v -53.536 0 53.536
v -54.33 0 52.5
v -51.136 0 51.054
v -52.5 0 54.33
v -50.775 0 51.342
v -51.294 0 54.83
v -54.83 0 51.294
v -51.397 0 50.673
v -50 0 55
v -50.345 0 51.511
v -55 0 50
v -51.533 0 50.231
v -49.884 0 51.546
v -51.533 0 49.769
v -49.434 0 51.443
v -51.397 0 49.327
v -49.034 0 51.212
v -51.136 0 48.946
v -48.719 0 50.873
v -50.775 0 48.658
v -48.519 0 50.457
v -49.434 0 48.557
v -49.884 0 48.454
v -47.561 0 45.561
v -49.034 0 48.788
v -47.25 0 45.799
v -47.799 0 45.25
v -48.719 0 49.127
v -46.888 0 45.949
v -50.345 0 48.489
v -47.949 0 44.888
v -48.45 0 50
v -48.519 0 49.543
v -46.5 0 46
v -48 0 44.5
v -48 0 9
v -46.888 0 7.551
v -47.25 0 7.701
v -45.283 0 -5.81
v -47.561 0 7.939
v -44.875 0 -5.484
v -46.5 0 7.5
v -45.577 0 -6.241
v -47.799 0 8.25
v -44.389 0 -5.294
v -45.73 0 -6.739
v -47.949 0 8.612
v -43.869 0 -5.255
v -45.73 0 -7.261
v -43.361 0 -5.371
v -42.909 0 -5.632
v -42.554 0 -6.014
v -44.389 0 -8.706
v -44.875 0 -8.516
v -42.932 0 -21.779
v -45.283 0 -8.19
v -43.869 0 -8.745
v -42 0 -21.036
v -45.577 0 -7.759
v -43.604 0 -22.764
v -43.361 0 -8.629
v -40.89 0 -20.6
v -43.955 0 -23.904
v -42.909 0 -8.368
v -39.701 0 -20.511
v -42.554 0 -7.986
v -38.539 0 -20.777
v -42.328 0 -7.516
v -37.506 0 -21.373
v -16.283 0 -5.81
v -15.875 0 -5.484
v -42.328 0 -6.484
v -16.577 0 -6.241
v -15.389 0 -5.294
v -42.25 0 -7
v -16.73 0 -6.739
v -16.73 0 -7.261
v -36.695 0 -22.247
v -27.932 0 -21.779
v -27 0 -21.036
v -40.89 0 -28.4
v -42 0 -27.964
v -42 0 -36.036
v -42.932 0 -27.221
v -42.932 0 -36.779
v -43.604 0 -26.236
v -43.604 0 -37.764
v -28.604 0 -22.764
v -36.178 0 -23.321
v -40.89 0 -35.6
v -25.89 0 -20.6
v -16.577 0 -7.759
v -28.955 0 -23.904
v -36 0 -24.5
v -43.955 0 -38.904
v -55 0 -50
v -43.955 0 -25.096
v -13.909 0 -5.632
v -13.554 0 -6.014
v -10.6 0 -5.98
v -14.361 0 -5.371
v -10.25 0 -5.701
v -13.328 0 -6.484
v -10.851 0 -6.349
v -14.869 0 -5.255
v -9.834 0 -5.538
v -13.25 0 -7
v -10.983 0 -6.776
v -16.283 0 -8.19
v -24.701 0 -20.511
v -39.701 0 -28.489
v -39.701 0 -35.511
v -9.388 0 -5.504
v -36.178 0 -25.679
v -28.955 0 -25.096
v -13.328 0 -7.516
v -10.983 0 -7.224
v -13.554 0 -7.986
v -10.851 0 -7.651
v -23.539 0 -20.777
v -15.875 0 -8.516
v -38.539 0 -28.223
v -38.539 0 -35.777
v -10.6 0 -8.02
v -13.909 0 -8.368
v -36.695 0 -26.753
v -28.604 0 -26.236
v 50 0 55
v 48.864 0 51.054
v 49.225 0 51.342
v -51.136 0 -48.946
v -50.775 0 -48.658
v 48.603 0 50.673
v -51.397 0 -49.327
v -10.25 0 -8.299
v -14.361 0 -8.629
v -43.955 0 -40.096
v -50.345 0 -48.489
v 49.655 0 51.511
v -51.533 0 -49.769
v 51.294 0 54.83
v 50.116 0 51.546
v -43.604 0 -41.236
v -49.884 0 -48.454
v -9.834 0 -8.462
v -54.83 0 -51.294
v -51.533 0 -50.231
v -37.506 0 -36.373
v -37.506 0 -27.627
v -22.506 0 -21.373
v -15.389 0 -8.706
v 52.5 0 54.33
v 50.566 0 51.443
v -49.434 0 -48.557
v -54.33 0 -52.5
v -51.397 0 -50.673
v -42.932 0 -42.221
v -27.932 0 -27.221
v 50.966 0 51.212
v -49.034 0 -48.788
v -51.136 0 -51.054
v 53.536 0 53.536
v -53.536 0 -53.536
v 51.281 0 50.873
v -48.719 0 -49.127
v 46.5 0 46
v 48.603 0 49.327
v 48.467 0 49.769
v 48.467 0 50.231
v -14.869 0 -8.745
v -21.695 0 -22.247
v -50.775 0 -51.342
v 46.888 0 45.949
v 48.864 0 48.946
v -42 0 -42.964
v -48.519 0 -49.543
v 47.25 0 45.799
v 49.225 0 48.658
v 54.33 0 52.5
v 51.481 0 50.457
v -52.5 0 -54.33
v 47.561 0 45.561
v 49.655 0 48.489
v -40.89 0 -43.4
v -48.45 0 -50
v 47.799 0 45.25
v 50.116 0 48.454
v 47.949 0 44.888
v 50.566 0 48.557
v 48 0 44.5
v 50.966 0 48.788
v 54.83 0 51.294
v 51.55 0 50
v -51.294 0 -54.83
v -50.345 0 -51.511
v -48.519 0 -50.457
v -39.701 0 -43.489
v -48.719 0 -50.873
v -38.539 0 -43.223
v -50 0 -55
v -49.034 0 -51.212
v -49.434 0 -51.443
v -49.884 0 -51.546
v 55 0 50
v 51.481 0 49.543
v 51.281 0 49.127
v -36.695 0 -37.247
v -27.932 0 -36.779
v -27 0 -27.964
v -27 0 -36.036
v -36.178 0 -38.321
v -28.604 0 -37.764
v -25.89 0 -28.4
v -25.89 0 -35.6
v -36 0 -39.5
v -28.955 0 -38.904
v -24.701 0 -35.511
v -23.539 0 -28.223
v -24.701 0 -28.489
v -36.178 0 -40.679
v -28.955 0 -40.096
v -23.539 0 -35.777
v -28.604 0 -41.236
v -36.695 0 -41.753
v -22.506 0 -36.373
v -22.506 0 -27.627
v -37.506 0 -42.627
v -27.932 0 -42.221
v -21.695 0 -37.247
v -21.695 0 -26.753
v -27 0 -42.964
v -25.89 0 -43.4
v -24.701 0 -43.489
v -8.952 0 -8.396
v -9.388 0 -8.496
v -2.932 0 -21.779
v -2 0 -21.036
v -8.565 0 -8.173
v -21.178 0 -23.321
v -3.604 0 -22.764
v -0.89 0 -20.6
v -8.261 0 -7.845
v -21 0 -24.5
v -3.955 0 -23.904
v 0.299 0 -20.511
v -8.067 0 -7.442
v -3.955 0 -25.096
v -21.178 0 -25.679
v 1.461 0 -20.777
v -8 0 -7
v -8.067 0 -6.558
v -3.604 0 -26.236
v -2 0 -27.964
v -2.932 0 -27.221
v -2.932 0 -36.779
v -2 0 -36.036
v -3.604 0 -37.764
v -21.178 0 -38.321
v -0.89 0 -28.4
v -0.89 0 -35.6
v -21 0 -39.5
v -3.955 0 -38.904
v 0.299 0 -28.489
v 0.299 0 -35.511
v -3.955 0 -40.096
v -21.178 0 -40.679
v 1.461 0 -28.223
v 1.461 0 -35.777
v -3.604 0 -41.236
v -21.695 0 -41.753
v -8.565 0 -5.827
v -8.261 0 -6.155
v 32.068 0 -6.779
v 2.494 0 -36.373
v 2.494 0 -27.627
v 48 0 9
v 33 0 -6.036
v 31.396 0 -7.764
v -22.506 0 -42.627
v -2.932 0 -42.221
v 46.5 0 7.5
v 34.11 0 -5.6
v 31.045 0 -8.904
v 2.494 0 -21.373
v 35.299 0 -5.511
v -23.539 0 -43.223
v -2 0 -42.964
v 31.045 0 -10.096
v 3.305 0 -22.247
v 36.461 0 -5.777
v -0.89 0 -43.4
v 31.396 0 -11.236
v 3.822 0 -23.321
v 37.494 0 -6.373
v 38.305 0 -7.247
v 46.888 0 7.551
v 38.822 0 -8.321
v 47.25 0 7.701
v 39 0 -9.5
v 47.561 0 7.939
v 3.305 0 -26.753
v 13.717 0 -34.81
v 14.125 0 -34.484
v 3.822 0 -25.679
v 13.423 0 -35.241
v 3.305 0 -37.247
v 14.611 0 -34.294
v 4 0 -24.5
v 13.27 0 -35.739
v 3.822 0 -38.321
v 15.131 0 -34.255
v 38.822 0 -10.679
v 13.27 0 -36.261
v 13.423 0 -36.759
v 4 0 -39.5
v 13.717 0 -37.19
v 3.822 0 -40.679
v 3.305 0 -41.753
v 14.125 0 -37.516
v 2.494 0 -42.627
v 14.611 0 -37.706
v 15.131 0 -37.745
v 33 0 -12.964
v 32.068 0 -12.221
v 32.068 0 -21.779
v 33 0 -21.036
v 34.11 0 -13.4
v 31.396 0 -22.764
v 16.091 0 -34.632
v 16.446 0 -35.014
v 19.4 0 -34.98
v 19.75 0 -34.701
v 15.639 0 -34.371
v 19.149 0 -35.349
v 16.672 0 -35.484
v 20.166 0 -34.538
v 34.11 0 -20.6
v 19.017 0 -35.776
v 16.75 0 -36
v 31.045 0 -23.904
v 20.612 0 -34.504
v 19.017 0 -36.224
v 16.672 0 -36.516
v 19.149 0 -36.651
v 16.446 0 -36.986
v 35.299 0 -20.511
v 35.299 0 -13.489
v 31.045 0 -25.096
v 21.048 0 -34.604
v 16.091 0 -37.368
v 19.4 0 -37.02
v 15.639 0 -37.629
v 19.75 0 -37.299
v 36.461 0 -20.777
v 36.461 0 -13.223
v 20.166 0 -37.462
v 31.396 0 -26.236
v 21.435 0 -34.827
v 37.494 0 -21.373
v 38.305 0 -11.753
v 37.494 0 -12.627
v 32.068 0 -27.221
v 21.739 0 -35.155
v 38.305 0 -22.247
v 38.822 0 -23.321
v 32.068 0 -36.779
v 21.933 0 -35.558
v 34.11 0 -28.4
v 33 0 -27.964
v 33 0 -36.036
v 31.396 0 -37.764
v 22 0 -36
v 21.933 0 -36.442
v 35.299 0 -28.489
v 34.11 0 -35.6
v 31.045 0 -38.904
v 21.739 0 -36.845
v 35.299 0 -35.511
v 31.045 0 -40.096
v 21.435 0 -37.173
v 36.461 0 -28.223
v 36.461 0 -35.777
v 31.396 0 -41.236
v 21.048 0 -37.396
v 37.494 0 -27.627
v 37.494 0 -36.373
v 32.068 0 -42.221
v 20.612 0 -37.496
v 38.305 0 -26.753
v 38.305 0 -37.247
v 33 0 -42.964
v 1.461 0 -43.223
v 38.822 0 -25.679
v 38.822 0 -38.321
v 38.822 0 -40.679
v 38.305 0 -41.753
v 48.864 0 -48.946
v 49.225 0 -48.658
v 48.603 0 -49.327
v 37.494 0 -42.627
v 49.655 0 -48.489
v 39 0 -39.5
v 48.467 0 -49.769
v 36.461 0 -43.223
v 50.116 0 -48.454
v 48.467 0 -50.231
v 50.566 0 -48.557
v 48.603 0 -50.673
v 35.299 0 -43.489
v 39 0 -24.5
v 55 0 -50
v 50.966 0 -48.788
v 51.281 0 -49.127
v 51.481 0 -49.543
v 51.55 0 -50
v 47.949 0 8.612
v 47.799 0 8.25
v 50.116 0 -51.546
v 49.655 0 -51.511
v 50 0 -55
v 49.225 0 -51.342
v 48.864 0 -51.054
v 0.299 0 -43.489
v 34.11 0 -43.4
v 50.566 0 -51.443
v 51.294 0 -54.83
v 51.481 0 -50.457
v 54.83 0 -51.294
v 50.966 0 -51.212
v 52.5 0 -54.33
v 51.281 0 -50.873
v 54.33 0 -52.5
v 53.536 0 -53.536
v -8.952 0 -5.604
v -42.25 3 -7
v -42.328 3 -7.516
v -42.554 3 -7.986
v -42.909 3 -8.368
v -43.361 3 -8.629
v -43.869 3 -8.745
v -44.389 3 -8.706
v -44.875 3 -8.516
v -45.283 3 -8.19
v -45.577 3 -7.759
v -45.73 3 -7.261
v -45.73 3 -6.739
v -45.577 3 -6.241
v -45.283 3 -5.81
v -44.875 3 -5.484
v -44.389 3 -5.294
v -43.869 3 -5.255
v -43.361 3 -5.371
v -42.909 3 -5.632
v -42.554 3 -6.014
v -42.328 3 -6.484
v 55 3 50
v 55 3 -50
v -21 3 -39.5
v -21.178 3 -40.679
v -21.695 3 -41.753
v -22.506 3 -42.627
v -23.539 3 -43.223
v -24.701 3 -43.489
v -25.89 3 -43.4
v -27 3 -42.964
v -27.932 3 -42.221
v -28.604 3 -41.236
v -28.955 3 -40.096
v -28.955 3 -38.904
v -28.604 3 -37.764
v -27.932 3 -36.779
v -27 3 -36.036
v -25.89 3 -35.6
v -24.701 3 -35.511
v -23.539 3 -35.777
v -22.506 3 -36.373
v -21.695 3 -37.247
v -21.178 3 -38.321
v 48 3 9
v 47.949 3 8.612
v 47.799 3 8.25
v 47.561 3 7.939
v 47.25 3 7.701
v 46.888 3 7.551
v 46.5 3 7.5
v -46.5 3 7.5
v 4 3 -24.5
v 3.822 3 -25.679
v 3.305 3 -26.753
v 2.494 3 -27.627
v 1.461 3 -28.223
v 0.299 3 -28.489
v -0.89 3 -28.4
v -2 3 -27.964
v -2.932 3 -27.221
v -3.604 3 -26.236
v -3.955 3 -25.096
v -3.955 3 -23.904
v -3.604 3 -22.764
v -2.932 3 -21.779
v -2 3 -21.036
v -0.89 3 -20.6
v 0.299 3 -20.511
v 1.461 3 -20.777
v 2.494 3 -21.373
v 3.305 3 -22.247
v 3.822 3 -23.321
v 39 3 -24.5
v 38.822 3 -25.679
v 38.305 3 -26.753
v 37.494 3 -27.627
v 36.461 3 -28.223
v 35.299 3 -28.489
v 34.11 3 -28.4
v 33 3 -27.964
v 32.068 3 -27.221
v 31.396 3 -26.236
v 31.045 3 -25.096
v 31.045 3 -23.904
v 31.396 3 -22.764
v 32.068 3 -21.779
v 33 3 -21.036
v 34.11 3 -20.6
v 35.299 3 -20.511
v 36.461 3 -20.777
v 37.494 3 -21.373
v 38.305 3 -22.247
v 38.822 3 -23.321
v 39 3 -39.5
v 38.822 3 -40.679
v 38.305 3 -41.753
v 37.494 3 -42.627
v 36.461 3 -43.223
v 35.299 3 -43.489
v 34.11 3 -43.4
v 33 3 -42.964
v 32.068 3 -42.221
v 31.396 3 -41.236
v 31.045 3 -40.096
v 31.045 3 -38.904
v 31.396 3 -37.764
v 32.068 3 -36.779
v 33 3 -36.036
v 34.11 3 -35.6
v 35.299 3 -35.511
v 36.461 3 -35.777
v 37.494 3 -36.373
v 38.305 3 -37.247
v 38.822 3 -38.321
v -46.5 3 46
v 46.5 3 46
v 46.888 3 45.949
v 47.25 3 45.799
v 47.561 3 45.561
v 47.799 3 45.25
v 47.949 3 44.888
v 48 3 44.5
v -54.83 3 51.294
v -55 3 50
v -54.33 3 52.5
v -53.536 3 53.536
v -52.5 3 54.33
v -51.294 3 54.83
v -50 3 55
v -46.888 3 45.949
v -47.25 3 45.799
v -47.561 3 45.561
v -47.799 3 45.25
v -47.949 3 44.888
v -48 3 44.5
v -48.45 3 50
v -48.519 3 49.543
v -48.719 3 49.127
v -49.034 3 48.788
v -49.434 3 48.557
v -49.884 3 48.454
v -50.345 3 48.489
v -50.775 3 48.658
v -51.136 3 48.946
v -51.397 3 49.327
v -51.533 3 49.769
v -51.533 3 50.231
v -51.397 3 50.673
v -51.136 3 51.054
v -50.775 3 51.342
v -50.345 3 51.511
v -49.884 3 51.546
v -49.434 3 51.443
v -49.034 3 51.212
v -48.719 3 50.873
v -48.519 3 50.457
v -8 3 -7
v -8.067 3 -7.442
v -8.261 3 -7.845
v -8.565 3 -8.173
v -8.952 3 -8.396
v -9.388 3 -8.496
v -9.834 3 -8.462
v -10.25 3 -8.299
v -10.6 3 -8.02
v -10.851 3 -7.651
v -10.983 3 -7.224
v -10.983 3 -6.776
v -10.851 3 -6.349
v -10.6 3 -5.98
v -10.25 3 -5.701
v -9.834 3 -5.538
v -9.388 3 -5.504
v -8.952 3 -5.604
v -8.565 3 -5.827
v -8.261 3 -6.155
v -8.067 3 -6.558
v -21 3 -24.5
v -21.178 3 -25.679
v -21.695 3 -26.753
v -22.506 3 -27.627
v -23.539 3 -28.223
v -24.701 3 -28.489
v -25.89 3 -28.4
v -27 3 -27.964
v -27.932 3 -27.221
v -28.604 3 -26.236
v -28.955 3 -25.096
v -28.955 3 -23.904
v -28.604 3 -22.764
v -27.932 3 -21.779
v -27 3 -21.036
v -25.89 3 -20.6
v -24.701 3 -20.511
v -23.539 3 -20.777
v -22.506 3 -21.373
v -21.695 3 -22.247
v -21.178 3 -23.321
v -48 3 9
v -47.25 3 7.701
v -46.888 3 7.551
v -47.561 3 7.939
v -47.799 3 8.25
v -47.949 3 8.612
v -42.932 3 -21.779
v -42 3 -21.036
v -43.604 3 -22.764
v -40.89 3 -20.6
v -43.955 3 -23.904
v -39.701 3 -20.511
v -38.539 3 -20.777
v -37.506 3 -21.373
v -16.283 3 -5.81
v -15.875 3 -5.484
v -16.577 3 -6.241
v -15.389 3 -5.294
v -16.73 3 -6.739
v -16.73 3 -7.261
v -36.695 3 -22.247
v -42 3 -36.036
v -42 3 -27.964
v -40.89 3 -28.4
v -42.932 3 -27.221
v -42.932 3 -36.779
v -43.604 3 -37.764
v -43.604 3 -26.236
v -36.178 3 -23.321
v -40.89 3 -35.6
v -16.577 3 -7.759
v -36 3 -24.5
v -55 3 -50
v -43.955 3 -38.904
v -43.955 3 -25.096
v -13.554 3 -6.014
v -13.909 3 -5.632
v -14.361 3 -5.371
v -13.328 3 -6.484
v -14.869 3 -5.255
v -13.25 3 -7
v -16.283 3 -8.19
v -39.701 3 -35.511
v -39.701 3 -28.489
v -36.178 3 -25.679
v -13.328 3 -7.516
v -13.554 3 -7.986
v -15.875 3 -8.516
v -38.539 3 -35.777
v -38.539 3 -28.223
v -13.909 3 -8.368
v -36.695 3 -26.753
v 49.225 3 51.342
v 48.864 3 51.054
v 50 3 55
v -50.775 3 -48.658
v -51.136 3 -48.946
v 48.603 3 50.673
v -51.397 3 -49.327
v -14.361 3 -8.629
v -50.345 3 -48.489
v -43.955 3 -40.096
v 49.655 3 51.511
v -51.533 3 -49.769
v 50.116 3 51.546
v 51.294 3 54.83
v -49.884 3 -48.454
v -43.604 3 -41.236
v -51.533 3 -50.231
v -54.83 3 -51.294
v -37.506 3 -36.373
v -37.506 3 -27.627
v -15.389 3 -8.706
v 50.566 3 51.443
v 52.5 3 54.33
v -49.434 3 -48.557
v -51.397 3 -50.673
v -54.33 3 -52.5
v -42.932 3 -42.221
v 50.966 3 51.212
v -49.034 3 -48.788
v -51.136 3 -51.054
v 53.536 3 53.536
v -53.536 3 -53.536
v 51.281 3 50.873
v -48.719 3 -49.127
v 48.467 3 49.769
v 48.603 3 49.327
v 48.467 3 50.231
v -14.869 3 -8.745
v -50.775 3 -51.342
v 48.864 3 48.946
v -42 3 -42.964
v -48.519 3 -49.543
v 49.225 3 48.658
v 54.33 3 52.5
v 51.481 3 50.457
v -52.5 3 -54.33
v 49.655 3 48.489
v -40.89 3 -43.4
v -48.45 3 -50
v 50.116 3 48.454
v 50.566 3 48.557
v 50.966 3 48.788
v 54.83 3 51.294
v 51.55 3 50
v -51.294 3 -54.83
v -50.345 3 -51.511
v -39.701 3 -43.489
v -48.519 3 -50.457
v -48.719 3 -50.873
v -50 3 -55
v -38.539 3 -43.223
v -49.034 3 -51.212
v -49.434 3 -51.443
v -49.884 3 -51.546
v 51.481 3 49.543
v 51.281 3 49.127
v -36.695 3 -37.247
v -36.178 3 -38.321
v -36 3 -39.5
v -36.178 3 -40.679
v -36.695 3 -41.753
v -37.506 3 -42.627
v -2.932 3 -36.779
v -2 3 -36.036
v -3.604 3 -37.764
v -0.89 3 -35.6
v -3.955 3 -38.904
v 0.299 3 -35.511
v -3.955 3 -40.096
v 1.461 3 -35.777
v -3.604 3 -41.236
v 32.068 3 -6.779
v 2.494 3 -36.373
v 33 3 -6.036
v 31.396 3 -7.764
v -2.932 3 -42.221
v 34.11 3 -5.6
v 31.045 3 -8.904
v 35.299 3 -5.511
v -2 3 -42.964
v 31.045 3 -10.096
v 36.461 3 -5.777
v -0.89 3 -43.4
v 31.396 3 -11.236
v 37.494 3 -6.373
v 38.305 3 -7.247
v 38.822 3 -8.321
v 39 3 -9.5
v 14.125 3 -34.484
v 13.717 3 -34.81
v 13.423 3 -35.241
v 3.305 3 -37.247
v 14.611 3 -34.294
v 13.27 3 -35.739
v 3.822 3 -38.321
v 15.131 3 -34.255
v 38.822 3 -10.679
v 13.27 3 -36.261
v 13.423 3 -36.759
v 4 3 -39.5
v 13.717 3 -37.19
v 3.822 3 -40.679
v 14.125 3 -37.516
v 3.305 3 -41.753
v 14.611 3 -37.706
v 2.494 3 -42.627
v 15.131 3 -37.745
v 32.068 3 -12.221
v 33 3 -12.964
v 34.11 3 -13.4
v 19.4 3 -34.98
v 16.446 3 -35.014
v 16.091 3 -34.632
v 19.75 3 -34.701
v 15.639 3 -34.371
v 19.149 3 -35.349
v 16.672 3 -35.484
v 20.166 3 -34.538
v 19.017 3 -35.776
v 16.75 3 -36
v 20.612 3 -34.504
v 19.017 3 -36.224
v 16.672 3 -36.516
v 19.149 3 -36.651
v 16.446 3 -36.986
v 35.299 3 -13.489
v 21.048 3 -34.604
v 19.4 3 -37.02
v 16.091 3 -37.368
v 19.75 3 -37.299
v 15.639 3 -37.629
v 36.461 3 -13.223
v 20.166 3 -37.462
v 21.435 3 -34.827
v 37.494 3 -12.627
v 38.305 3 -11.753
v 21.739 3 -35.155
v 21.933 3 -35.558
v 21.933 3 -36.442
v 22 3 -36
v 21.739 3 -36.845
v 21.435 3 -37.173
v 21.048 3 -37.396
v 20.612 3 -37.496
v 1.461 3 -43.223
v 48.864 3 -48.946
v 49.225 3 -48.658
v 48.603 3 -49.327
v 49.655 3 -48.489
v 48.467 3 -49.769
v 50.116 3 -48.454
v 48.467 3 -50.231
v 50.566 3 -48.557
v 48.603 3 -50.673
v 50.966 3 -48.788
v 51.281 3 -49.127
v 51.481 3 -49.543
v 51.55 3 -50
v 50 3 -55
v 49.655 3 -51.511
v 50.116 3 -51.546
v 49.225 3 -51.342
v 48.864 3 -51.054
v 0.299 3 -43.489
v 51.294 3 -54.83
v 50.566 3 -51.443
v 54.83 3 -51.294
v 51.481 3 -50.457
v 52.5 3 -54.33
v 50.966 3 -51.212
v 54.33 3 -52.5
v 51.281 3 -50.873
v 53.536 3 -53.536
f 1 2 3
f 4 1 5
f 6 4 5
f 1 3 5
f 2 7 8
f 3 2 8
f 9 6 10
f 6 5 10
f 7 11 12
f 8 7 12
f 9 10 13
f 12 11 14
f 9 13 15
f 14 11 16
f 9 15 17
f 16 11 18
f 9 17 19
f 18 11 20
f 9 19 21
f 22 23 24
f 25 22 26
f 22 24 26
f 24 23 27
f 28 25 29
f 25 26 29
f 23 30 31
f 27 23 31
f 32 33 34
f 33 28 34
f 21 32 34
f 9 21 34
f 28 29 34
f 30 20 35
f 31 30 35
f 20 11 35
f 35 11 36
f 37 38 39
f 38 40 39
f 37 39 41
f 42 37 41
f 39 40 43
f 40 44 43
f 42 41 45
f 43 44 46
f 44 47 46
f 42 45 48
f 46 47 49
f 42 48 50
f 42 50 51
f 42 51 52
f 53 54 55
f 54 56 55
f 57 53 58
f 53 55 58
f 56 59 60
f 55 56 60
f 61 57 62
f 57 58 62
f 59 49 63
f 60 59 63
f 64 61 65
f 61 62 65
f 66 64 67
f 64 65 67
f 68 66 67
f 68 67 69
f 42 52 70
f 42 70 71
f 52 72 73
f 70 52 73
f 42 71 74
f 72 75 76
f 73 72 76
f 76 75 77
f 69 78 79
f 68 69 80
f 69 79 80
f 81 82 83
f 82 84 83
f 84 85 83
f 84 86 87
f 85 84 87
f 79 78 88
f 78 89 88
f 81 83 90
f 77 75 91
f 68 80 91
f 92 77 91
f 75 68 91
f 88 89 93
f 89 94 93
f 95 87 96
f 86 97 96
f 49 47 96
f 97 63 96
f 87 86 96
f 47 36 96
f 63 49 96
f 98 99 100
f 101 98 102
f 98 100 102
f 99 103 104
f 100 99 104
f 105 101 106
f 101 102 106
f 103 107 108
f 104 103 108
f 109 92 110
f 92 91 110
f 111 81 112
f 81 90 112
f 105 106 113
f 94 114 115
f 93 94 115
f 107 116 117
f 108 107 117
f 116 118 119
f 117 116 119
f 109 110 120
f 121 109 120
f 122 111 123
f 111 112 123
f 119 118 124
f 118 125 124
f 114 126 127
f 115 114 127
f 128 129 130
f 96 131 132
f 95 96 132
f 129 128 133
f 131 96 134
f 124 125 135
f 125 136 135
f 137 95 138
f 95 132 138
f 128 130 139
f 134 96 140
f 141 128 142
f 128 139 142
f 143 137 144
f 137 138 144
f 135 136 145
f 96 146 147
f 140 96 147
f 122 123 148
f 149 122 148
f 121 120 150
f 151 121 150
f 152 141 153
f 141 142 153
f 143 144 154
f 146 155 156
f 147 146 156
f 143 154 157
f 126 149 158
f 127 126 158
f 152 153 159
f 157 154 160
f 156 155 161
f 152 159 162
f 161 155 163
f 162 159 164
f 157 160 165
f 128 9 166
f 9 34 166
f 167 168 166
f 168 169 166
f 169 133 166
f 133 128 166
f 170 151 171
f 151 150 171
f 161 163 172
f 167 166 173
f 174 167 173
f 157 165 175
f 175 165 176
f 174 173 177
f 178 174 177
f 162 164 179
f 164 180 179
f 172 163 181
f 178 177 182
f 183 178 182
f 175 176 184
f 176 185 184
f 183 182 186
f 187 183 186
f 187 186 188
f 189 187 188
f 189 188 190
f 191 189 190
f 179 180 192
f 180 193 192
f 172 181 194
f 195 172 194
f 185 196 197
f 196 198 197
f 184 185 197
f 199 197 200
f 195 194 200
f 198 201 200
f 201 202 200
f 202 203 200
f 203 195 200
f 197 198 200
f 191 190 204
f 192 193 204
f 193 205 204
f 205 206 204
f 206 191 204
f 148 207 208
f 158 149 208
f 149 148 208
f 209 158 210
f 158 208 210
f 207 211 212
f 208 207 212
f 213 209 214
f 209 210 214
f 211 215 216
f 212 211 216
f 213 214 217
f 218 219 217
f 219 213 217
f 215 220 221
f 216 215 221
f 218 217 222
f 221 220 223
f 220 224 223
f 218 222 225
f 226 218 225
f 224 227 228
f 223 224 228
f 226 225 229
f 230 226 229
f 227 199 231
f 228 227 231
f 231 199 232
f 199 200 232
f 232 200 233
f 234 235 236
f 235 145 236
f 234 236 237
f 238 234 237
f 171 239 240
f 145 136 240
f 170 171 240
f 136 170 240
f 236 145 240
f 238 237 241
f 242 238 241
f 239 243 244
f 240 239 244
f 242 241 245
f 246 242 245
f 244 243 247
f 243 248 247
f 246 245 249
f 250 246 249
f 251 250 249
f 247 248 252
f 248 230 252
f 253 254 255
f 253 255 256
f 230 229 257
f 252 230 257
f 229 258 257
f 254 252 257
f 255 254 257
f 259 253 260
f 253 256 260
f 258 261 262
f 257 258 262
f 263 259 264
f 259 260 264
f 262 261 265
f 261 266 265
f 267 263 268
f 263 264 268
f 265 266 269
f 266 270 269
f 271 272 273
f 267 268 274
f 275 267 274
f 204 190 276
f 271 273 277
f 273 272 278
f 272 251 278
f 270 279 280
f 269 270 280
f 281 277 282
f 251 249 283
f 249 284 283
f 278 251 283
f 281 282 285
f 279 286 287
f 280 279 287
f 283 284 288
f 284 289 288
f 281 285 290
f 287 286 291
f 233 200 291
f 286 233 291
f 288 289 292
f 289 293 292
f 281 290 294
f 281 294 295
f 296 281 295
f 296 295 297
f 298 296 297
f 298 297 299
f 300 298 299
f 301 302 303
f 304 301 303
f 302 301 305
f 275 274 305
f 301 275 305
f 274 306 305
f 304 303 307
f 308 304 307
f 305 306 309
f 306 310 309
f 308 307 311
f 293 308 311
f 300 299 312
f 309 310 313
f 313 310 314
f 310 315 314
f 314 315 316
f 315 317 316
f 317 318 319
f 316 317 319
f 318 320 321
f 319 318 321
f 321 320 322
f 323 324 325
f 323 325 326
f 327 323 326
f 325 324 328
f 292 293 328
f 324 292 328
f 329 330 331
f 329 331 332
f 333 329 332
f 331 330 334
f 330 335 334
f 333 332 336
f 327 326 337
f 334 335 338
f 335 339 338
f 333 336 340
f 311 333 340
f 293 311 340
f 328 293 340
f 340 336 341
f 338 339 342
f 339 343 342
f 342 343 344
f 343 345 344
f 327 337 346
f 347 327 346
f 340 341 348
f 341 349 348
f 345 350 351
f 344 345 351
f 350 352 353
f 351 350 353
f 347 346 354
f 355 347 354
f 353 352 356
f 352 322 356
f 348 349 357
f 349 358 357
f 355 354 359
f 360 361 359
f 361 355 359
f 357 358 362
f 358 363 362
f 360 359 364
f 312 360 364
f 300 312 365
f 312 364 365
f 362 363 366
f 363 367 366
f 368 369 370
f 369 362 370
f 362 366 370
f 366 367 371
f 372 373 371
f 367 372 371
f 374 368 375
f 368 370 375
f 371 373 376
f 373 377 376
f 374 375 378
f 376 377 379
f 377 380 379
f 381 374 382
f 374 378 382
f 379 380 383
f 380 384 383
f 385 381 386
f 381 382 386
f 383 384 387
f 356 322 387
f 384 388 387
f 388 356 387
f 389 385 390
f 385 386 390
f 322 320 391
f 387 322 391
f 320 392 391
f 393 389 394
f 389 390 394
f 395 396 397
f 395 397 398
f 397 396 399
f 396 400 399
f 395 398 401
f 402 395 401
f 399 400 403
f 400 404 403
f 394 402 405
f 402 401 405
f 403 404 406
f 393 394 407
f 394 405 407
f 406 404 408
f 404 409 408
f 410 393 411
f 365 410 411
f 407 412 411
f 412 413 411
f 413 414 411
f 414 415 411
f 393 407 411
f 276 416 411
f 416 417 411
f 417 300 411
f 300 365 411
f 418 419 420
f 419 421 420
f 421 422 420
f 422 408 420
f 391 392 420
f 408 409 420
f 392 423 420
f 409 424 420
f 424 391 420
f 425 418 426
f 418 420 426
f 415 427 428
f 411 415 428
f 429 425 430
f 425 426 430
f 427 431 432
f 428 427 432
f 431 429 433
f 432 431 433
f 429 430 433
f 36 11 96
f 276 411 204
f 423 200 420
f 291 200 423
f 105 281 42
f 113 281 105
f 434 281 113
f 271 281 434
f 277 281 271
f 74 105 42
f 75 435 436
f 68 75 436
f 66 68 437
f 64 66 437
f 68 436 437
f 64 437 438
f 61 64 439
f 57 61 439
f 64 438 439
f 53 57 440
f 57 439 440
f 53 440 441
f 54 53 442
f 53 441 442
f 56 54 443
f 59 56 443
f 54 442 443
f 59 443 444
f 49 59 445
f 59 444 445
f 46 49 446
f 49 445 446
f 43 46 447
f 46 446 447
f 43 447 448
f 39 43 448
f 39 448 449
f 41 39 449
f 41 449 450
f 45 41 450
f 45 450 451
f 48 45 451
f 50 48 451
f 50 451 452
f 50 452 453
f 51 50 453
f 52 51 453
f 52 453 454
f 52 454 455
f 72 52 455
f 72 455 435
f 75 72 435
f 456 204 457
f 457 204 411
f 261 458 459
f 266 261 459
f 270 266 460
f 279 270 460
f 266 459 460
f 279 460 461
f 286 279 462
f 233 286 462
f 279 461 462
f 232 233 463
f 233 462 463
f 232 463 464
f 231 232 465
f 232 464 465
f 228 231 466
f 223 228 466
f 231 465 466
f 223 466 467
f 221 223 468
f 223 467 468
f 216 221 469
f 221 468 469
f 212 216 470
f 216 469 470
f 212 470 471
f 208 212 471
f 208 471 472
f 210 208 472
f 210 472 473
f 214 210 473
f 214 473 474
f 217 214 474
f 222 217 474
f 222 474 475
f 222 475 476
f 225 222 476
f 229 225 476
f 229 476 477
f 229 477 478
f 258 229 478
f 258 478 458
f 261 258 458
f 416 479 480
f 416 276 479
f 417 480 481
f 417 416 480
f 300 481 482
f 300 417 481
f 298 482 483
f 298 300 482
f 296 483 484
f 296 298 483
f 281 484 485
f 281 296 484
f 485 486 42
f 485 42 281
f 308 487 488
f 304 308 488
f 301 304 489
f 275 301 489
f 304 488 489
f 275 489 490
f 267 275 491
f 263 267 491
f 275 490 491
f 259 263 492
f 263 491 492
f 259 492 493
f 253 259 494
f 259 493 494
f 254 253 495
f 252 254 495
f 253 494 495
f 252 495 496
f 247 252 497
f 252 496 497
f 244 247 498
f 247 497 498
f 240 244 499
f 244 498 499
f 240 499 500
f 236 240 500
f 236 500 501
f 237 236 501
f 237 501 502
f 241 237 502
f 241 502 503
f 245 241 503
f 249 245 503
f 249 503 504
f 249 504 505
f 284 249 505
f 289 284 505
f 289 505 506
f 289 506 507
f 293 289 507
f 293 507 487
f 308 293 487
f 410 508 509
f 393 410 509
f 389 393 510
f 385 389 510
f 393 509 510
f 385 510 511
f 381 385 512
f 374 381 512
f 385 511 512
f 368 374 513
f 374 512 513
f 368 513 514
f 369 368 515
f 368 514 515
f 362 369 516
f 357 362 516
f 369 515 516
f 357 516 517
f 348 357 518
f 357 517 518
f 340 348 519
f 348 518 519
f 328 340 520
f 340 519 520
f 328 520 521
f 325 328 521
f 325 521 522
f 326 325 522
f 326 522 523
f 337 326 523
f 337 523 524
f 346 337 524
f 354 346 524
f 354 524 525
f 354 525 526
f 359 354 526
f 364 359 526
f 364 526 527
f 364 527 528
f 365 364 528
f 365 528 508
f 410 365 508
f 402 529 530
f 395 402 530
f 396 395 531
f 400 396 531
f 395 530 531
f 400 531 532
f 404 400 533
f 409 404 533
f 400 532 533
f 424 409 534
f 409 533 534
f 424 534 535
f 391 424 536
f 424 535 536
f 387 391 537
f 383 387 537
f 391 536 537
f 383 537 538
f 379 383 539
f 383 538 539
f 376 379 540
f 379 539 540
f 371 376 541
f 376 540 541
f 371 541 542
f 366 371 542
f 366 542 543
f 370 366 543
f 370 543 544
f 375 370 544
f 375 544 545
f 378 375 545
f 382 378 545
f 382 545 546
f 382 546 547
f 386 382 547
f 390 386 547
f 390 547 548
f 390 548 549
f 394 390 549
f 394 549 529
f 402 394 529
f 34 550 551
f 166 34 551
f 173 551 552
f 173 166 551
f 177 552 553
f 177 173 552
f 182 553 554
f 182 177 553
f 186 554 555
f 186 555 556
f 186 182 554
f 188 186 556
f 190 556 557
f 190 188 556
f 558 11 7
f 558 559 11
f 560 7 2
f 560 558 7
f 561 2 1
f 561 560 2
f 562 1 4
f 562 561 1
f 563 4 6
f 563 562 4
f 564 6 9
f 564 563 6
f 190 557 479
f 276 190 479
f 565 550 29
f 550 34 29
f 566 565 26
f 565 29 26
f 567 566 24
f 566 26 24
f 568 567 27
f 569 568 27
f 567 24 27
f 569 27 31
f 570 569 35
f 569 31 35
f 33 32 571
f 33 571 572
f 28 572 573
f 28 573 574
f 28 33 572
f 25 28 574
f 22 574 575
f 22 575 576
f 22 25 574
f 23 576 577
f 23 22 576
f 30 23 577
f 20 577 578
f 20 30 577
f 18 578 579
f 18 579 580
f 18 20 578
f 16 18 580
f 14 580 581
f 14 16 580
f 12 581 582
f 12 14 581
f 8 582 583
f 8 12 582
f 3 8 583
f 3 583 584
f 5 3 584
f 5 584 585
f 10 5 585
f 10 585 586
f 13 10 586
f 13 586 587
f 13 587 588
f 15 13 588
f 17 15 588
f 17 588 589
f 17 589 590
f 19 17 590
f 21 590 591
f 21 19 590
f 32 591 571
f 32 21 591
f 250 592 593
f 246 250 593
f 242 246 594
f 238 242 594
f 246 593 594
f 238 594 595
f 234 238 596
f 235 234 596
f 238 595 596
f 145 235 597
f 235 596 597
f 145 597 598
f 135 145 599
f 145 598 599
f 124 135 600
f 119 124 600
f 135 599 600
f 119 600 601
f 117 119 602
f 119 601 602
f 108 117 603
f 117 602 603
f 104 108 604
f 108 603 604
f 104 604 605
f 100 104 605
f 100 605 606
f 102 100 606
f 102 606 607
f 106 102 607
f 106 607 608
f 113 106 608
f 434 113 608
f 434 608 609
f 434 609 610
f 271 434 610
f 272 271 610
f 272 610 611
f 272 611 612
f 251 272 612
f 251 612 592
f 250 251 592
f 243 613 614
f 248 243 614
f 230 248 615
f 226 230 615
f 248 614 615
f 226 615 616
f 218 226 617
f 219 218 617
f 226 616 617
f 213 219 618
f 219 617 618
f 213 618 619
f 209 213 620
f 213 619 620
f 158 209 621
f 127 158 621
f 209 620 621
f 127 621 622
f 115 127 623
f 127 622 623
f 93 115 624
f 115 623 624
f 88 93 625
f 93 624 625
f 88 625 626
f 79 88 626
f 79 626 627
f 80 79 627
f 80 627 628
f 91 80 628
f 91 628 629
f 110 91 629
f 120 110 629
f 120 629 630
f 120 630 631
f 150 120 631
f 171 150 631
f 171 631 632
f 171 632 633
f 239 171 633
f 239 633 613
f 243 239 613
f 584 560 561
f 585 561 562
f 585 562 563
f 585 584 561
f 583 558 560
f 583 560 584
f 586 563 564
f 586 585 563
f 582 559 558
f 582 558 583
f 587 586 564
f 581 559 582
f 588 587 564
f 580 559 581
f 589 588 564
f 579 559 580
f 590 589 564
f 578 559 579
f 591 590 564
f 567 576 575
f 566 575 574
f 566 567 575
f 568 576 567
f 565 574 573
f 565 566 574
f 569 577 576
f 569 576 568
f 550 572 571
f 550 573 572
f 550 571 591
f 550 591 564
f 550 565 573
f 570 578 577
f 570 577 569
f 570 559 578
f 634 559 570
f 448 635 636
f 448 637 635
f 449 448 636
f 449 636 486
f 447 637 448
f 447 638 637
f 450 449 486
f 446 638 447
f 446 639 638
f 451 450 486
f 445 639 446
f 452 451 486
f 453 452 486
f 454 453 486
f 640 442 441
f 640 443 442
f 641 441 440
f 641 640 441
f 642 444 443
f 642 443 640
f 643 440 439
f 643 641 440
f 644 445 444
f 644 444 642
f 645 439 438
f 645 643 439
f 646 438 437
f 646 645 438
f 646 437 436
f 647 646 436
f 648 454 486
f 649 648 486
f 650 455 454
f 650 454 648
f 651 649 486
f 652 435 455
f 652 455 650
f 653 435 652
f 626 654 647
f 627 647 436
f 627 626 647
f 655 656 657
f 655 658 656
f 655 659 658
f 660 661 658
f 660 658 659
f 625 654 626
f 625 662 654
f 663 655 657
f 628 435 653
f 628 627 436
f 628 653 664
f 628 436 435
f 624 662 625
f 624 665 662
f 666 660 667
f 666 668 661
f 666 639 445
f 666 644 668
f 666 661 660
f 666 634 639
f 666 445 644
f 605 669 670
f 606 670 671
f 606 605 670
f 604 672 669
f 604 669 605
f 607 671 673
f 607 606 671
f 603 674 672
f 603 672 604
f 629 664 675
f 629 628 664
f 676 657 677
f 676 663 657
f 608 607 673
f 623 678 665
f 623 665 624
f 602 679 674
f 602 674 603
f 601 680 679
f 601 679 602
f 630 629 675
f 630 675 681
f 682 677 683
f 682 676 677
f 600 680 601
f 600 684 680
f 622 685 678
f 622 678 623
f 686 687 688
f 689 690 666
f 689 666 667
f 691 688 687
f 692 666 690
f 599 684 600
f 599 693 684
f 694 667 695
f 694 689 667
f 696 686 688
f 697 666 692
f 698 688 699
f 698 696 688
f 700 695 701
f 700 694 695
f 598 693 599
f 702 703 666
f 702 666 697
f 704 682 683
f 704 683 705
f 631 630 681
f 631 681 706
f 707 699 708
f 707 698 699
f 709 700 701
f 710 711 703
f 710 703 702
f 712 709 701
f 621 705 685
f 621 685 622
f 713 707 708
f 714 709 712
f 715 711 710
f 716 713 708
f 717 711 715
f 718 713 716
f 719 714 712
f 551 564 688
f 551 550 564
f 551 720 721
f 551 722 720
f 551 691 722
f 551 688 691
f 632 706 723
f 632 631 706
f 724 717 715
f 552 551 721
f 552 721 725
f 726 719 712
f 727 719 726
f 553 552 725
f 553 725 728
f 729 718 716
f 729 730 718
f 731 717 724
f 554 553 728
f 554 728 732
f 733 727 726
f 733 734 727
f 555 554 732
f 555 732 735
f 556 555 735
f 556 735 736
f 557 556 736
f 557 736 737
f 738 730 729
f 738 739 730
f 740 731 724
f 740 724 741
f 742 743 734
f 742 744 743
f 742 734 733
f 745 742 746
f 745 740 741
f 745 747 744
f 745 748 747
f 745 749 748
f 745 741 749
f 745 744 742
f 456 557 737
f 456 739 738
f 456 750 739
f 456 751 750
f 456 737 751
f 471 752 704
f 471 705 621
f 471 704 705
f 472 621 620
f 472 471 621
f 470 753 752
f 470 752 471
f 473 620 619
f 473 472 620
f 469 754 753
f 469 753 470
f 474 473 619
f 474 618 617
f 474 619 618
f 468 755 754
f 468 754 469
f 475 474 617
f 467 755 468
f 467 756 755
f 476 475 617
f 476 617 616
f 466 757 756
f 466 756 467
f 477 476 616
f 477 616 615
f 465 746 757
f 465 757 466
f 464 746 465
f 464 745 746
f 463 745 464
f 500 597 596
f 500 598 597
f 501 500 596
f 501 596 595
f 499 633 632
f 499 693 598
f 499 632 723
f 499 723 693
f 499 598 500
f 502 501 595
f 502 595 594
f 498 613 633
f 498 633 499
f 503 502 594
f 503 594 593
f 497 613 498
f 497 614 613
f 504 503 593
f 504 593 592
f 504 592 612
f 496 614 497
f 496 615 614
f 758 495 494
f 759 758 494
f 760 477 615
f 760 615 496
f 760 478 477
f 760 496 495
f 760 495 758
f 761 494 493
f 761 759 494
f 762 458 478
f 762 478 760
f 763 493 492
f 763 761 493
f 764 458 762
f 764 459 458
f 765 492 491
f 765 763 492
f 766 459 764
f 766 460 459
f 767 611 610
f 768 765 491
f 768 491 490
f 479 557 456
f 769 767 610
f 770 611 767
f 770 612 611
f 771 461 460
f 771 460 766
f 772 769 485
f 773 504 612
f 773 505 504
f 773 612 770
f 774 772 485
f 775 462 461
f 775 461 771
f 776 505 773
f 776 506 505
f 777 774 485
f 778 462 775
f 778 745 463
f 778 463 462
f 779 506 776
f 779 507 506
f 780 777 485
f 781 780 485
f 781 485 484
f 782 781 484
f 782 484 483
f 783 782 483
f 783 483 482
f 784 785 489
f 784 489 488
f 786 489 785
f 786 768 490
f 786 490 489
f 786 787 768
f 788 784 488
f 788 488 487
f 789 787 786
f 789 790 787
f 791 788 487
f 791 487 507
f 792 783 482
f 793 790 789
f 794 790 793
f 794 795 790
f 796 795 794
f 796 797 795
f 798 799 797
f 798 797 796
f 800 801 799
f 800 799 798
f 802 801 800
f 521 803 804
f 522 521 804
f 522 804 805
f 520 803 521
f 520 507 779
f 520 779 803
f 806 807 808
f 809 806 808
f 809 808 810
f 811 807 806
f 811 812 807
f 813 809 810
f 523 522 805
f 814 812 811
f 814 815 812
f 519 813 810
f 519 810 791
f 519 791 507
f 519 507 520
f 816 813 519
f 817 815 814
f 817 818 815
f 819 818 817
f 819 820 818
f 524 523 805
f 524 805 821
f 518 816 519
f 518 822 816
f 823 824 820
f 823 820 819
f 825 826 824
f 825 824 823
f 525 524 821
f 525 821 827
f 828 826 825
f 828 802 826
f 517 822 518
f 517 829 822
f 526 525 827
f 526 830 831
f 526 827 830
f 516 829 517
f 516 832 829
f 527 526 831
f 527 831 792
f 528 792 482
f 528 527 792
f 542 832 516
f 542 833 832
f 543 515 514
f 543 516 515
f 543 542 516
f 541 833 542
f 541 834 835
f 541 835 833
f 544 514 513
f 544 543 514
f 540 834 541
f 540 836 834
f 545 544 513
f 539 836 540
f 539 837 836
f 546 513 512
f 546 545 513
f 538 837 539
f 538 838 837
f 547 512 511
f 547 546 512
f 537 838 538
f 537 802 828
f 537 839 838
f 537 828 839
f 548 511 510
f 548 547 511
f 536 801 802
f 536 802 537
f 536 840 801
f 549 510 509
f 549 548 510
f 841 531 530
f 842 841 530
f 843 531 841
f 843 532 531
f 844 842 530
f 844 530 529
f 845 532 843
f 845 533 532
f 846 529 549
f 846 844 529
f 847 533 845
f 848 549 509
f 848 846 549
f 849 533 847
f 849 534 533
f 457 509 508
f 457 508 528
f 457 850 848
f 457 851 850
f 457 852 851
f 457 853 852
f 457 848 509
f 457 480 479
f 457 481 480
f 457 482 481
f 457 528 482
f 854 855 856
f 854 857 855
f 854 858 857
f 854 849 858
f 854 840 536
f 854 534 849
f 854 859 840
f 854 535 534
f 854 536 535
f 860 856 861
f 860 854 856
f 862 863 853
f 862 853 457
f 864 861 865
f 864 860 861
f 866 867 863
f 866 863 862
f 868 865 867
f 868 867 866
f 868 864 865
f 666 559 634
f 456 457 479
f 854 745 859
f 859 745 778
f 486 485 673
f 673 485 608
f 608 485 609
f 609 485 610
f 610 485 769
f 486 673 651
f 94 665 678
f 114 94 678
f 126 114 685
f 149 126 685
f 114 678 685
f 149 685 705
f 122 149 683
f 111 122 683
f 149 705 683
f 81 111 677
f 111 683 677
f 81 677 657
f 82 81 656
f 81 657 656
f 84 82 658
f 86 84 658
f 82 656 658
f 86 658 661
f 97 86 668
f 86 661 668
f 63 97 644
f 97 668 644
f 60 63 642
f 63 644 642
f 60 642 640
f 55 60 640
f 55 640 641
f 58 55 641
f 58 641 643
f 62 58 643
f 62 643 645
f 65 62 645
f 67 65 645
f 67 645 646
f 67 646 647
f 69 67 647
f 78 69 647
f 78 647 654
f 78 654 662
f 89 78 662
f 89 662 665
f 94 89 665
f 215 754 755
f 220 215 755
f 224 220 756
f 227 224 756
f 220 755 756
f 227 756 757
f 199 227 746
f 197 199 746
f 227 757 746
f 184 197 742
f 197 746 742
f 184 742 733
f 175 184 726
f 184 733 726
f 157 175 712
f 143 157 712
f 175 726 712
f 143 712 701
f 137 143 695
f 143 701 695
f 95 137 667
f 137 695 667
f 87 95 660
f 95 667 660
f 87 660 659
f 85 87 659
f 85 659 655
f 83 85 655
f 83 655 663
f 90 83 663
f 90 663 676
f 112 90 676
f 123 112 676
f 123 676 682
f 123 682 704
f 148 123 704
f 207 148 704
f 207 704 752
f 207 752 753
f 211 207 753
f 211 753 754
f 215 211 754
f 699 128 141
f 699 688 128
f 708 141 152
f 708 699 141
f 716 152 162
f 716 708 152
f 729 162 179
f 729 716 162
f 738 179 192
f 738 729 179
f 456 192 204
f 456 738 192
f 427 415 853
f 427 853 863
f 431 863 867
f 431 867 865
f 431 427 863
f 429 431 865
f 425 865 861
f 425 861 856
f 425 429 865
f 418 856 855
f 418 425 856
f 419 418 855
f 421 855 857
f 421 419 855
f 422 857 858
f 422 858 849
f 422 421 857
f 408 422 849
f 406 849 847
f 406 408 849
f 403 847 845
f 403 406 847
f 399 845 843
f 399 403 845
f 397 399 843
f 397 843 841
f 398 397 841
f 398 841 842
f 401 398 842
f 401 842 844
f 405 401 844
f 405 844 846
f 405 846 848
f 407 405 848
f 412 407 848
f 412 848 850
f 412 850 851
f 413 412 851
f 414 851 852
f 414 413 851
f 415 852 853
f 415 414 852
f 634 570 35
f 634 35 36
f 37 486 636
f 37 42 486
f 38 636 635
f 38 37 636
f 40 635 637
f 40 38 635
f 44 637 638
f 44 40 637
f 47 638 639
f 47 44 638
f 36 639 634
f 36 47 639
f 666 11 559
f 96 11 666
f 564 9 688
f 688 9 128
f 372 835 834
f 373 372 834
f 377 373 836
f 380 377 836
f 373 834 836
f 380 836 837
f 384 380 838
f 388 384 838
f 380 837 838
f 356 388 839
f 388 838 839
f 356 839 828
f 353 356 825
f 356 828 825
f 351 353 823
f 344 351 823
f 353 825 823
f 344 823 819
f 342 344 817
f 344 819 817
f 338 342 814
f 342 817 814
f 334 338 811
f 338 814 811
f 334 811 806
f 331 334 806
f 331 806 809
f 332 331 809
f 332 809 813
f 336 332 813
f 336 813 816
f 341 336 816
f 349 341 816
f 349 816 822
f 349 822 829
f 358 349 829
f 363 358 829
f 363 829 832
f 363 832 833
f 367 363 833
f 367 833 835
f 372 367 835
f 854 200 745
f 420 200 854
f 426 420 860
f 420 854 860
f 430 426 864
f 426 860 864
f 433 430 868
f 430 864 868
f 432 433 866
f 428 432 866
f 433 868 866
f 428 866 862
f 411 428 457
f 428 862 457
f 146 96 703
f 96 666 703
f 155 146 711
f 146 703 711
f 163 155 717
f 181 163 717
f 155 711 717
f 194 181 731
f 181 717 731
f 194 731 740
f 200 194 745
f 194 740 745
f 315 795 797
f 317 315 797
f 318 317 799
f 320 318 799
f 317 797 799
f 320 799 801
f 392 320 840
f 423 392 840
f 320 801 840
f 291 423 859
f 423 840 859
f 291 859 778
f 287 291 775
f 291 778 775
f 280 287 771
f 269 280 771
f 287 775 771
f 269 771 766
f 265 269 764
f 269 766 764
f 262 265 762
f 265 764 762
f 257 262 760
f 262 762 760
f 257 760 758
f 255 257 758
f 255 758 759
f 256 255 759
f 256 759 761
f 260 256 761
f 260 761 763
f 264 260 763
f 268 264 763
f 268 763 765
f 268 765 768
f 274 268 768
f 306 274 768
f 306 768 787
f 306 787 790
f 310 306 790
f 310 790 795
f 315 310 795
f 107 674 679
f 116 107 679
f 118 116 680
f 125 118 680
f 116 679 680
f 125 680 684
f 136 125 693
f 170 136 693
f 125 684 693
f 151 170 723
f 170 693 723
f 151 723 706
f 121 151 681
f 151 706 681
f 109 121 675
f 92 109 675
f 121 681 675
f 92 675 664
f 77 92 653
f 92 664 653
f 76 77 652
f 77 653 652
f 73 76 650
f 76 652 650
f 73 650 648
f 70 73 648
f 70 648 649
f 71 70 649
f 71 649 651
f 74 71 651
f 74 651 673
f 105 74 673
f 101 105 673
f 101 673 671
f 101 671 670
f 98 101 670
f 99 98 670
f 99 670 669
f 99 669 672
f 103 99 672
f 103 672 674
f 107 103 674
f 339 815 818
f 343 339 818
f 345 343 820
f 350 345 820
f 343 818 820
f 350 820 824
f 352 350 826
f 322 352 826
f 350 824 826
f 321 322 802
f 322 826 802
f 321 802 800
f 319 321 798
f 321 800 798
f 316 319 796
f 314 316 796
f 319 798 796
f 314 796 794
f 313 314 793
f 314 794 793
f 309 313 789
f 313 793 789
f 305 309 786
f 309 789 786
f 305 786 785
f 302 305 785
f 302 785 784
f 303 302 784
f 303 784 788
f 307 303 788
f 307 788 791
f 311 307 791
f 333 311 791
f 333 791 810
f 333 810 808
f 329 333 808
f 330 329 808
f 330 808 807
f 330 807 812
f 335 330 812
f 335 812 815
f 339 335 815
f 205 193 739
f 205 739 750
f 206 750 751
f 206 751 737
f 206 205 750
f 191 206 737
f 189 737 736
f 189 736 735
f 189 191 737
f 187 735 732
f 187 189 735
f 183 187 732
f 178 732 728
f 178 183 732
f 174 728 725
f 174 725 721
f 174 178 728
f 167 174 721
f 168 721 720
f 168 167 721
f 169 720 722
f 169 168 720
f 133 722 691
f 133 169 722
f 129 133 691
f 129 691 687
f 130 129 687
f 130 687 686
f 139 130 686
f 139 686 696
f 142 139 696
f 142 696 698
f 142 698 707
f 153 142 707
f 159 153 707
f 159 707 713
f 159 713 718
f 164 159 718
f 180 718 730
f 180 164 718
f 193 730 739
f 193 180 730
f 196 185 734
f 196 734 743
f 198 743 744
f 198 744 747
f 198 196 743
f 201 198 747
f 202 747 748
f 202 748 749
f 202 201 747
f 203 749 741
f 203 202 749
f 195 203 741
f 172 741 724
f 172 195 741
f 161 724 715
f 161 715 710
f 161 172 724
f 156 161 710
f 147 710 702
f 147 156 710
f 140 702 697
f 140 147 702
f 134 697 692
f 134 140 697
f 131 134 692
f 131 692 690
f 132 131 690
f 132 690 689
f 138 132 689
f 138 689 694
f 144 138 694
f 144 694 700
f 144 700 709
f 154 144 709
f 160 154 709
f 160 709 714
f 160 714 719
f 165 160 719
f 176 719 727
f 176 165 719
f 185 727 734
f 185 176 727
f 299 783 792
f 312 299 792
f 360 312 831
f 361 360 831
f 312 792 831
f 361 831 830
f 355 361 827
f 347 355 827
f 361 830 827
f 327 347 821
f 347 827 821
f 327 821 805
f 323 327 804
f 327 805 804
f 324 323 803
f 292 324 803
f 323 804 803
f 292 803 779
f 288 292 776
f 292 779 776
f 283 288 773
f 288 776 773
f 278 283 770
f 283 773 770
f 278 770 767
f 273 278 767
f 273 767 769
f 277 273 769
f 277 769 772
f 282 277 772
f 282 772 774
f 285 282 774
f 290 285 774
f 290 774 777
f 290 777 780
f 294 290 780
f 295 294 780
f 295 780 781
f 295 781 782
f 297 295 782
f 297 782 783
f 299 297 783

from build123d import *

# Parameters (mm, degrees)
SKETCH1_W           = 110
SKETCH1_H           = 110
SKETCH1_R           = 1.55
BOSS_EXTRUDE1_DEPTH = 3
FILLET1_R           = 5
SKETCH2_W           = 96
SKETCH2_H           = 38.5
CUT_EXTRUDE1_DEPTH  = 4
FILLET2_R           = 1.5
SKETCH3_R           = 4
CUT_EXTRUDE2_DEPTH  = 4
SKETCH4_R           = 1.75
SKETCH4_R_2         = 1.5
CUT_EXTRUDE3_DEPTH  = 4


with BuildPart() as part:
    # Sketch1 → Boss-Extrude1 (new body)
    with BuildSketch(Plane(origin=(0, 0, 0), x_dir=(1, 0, 0), z_dir=(0, 1, 0))):
        Rectangle(SKETCH1_W, SKETCH1_H)
        with Locations((-50, 50)):
            Circle(SKETCH1_R, mode=Mode.SUBTRACT)
        with Locations((50, 50)):
            Circle(SKETCH1_R, mode=Mode.SUBTRACT)
        with Locations((50, -50)):
            Circle(SKETCH1_R, mode=Mode.SUBTRACT)
        with Locations((-50, -50)):
            Circle(SKETCH1_R, mode=Mode.SUBTRACT)
    extrude(amount=BOSS_EXTRUDE1_DEPTH)

    # Fillet1
    fillet1_edges = [part.edges().sort_by_distance(p)[0] for p in [
        (-55, 1.5, -55),
        (55, 1.5, -55),
        (55, 1.5, 55),
        (-55, 1.5, 55),
    ]]
    fillet(fillet1_edges, radius=FILLET1_R)

    # Sketch2 → Cut-Extrude1 (cut, through all)
    with BuildSketch(Plane(origin=(0, 3, 0), x_dir=(1, 0, 0), z_dir=(0, 1, 0))):
        with Locations((0, -26.75)):
            Rectangle(SKETCH2_W, SKETCH2_H)
    extrude(amount=-CUT_EXTRUDE1_DEPTH, mode=Mode.SUBTRACT)

    # Fillet2
    fillet2_edges = [part.edges().sort_by_distance(p)[0] for p in [
        (-48, 1.5, 46),
        (-48, 1.5, 7.5),
        (48, 1.5, 7.5),
        (48, 1.5, 46),
    ]]
    fillet(fillet2_edges, radius=FILLET2_R)

    # Sketch3 → Cut-Extrude2 (cut, through all)
    with BuildSketch(Plane(origin=(0, 3, 0), x_dir=(1, 0, 0), z_dir=(0, 1, 0))):
        with Locations((-40, 39.5)):
            Circle(SKETCH3_R)
        with Locations((-40, 24.5)):
            Circle(SKETCH3_R)
        with Locations((-25, 39.5)):
            Circle(SKETCH3_R)
        with Locations((-25, 24.5)):
            Circle(SKETCH3_R)
        with Locations((0, 39.5)):
            Circle(SKETCH3_R)
        with Locations((0, 24.5)):
            Circle(SKETCH3_R)
        with Locations((35, 39.5)):
            Circle(SKETCH3_R)
        with Locations((35, 24.5)):
            Circle(SKETCH3_R)
        with Locations((35, 9.5)):
            Circle(SKETCH3_R)
    extrude(amount=-CUT_EXTRUDE2_DEPTH, mode=Mode.SUBTRACT)

    # Sketch4 → Cut-Extrude3 (cut, through all)
    with BuildSketch(Plane(origin=(0, 3, 0), x_dir=(1, 0, 0), z_dir=(0, 1, 0))):
        with Locations((-44, 7)):
            Circle(SKETCH4_R)
        with Locations((-15, 7)):
            Circle(SKETCH4_R)
        with Locations((-9.5, 7)):
            Circle(SKETCH4_R_2)
        with Locations((15, 36)):
            Circle(SKETCH4_R)
        with Locations((20.5, 36)):
            Circle(SKETCH4_R_2)
    extrude(amount=-CUT_EXTRUDE3_DEPTH, mode=Mode.SUBTRACT)


solid = part.part
